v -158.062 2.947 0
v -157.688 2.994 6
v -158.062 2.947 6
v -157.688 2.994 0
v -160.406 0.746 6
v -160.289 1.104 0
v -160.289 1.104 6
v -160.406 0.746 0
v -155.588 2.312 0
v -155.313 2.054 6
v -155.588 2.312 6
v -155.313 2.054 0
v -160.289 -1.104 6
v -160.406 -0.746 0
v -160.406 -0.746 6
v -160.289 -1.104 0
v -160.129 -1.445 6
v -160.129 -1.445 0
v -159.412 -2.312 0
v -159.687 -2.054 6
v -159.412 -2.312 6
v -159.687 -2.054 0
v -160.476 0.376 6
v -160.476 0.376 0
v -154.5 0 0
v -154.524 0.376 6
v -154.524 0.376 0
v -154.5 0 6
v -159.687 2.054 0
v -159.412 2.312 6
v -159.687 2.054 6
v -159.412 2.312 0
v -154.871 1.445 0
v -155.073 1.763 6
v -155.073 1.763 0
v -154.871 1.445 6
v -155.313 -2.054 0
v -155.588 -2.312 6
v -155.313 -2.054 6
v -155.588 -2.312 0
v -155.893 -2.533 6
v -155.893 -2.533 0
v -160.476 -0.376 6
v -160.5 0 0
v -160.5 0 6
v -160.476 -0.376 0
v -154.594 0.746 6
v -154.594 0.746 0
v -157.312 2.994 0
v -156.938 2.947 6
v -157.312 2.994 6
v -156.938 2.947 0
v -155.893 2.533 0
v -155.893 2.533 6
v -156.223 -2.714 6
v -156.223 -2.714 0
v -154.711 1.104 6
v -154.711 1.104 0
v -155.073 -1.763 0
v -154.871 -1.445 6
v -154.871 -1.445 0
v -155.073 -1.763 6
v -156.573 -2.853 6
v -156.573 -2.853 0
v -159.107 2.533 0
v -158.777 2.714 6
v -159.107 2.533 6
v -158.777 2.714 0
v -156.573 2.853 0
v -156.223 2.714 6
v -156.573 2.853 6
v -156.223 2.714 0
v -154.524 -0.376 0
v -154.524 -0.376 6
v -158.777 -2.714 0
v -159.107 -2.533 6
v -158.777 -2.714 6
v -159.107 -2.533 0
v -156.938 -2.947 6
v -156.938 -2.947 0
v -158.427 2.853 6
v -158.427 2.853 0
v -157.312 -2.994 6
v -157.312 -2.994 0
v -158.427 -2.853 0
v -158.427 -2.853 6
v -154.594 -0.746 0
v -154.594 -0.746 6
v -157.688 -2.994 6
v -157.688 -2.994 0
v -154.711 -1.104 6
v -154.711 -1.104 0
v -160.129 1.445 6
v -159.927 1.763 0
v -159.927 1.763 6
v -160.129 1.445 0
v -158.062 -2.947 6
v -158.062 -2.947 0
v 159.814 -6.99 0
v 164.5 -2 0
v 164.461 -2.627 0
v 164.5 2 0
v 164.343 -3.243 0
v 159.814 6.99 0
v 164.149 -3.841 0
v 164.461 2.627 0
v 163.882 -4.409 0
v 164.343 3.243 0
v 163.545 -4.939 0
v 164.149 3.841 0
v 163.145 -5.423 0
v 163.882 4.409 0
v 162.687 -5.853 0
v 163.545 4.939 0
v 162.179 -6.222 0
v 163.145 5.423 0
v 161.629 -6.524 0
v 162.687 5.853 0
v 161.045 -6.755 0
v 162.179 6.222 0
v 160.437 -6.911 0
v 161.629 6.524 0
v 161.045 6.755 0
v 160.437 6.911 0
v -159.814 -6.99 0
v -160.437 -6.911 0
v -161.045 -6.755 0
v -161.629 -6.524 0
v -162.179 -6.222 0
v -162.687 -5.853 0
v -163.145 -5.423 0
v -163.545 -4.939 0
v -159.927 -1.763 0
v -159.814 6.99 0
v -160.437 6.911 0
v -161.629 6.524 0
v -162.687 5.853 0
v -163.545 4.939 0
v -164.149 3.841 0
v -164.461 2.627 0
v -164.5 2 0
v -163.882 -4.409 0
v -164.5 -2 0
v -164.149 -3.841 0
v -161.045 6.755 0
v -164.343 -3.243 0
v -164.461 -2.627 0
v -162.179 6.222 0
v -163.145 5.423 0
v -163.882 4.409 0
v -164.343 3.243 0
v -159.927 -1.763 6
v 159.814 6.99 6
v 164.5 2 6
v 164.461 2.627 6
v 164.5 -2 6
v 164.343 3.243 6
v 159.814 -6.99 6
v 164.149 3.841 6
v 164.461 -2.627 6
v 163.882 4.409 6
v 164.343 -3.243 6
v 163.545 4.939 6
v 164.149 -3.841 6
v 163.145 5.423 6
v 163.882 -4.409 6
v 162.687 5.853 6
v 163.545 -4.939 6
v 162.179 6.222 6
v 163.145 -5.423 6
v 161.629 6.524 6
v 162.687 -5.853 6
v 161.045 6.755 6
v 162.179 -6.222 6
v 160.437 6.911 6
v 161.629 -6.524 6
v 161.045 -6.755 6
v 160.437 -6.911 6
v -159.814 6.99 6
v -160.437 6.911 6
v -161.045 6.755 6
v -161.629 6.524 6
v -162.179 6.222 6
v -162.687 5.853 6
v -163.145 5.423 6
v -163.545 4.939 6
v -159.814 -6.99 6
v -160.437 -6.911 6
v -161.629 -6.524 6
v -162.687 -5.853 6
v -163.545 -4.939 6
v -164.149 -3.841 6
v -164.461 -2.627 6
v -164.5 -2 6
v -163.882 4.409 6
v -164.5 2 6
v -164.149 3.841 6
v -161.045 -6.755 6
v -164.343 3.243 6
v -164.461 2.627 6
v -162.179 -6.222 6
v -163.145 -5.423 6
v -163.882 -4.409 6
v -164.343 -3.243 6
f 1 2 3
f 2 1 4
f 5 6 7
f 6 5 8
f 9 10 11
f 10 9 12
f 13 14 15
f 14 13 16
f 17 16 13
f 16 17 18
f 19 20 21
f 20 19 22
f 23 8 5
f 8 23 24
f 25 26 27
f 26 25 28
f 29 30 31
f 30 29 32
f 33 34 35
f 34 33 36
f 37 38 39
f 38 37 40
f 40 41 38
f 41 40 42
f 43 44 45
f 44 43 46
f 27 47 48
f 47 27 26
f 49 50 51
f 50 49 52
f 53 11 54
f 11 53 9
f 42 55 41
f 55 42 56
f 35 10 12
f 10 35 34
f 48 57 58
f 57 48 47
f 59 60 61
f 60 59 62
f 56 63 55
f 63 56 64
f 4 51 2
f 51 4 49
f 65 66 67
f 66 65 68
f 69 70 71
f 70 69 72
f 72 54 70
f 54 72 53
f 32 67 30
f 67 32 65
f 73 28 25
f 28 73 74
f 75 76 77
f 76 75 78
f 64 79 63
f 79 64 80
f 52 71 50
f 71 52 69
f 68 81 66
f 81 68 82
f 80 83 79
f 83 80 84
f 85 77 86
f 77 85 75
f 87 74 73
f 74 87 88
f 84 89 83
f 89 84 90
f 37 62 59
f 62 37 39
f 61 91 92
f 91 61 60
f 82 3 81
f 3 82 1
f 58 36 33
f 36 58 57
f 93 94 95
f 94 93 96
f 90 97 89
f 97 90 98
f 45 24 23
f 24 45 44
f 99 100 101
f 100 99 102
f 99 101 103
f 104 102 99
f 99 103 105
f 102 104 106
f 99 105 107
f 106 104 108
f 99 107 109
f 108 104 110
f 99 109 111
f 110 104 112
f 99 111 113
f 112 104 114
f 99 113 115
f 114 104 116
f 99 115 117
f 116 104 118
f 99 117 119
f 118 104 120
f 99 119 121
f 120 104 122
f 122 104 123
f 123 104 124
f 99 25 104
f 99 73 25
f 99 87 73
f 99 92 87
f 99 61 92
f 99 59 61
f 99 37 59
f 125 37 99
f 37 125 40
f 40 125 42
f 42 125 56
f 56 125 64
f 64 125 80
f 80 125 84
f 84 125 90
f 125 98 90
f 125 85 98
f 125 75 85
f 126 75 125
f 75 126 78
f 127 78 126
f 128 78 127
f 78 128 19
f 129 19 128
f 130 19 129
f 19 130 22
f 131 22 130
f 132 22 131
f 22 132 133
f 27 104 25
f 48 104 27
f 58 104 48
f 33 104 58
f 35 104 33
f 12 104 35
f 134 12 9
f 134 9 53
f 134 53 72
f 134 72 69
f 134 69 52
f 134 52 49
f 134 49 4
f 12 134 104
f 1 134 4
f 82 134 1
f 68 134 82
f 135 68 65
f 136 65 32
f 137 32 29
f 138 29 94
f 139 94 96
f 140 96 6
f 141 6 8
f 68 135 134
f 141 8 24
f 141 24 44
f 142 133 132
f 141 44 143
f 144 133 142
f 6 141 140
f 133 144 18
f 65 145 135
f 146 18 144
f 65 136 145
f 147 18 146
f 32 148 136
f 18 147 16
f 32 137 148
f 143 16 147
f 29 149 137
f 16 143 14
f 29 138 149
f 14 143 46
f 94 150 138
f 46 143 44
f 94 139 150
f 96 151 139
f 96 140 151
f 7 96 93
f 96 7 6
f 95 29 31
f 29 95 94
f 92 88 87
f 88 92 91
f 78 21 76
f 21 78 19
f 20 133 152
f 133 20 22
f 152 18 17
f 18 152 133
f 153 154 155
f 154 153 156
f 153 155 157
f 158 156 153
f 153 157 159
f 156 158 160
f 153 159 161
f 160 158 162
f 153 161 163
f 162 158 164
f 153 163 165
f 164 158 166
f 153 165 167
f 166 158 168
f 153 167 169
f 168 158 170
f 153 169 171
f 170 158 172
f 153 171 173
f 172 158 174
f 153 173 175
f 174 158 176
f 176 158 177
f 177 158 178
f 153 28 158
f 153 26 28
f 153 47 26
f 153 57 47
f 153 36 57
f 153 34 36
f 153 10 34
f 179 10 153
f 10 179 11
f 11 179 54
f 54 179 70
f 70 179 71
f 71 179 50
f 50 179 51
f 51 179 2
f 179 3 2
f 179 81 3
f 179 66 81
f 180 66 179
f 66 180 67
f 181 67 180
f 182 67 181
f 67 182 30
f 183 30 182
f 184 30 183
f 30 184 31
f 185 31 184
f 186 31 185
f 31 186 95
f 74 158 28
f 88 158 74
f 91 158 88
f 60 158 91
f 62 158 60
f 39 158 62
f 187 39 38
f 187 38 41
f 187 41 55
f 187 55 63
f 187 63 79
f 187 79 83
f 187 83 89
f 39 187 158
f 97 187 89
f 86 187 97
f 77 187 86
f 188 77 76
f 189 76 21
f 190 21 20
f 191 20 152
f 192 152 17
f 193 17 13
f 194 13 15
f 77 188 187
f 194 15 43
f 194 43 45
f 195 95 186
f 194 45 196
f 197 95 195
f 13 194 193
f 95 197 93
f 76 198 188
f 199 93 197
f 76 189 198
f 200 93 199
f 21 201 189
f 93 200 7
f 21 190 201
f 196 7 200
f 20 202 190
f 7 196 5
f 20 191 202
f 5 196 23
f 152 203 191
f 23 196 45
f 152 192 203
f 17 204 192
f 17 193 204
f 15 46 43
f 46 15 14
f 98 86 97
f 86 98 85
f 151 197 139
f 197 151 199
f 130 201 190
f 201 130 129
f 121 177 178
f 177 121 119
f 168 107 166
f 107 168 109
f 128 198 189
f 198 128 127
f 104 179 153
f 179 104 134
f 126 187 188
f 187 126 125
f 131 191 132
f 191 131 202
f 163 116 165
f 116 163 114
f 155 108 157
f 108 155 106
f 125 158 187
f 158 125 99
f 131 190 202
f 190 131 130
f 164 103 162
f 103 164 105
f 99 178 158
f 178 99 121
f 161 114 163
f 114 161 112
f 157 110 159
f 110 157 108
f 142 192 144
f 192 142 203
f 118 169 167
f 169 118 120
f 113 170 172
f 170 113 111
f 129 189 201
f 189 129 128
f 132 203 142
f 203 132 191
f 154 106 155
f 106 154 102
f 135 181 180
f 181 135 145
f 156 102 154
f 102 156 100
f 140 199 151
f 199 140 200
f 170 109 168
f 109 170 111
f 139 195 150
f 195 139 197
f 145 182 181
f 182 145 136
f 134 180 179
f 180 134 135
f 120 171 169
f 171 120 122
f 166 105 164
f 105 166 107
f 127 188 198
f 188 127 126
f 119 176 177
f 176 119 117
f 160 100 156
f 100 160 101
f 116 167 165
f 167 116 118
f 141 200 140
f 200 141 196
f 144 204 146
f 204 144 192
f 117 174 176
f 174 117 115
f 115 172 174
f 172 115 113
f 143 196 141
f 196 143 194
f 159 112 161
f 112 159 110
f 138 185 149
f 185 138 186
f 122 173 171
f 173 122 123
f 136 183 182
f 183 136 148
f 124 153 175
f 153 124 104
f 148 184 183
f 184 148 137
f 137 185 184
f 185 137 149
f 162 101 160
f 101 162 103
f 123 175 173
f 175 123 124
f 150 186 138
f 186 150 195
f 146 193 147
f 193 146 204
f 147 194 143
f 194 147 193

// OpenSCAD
$fn = 50;


difference() {
	union() {
		hull() {
			translate(v = [-159.5000000000, 2.0000000000, 0]) {
				cylinder(h = 6, r = 5);
			}
			translate(v = [159.5000000000, 2.0000000000, 0]) {
				cylinder(h = 6, r = 5);
			}
			translate(v = [-159.5000000000, -2.0000000000, 0]) {
				cylinder(h = 6, r = 5);
			}
			translate(v = [159.5000000000, -2.0000000000, 0]) {
				cylinder(h = 6, r = 5);
			}
		}
	}
	union() {
		translate(v = [-157.5000000000, 0.0000000000, 0]) {
			cylinder(h = 6, r = 3.0000000000);
		}
		translate(v = [-157.5000000000, 0.0000000000, 0]) {
			cylinder(h = 6, r = 1.5000000000);
		}
		translate(v = [-157.5000000000, 0.0000000000, 0]) {
			cylinder(h = 6, r = 1.5000000000);
		}
		translate(v = [-157.5000000000, 0.0000000000, 0]) {
			cylinder(h = 6, r = 1.5000000000);
		}
	}
}
